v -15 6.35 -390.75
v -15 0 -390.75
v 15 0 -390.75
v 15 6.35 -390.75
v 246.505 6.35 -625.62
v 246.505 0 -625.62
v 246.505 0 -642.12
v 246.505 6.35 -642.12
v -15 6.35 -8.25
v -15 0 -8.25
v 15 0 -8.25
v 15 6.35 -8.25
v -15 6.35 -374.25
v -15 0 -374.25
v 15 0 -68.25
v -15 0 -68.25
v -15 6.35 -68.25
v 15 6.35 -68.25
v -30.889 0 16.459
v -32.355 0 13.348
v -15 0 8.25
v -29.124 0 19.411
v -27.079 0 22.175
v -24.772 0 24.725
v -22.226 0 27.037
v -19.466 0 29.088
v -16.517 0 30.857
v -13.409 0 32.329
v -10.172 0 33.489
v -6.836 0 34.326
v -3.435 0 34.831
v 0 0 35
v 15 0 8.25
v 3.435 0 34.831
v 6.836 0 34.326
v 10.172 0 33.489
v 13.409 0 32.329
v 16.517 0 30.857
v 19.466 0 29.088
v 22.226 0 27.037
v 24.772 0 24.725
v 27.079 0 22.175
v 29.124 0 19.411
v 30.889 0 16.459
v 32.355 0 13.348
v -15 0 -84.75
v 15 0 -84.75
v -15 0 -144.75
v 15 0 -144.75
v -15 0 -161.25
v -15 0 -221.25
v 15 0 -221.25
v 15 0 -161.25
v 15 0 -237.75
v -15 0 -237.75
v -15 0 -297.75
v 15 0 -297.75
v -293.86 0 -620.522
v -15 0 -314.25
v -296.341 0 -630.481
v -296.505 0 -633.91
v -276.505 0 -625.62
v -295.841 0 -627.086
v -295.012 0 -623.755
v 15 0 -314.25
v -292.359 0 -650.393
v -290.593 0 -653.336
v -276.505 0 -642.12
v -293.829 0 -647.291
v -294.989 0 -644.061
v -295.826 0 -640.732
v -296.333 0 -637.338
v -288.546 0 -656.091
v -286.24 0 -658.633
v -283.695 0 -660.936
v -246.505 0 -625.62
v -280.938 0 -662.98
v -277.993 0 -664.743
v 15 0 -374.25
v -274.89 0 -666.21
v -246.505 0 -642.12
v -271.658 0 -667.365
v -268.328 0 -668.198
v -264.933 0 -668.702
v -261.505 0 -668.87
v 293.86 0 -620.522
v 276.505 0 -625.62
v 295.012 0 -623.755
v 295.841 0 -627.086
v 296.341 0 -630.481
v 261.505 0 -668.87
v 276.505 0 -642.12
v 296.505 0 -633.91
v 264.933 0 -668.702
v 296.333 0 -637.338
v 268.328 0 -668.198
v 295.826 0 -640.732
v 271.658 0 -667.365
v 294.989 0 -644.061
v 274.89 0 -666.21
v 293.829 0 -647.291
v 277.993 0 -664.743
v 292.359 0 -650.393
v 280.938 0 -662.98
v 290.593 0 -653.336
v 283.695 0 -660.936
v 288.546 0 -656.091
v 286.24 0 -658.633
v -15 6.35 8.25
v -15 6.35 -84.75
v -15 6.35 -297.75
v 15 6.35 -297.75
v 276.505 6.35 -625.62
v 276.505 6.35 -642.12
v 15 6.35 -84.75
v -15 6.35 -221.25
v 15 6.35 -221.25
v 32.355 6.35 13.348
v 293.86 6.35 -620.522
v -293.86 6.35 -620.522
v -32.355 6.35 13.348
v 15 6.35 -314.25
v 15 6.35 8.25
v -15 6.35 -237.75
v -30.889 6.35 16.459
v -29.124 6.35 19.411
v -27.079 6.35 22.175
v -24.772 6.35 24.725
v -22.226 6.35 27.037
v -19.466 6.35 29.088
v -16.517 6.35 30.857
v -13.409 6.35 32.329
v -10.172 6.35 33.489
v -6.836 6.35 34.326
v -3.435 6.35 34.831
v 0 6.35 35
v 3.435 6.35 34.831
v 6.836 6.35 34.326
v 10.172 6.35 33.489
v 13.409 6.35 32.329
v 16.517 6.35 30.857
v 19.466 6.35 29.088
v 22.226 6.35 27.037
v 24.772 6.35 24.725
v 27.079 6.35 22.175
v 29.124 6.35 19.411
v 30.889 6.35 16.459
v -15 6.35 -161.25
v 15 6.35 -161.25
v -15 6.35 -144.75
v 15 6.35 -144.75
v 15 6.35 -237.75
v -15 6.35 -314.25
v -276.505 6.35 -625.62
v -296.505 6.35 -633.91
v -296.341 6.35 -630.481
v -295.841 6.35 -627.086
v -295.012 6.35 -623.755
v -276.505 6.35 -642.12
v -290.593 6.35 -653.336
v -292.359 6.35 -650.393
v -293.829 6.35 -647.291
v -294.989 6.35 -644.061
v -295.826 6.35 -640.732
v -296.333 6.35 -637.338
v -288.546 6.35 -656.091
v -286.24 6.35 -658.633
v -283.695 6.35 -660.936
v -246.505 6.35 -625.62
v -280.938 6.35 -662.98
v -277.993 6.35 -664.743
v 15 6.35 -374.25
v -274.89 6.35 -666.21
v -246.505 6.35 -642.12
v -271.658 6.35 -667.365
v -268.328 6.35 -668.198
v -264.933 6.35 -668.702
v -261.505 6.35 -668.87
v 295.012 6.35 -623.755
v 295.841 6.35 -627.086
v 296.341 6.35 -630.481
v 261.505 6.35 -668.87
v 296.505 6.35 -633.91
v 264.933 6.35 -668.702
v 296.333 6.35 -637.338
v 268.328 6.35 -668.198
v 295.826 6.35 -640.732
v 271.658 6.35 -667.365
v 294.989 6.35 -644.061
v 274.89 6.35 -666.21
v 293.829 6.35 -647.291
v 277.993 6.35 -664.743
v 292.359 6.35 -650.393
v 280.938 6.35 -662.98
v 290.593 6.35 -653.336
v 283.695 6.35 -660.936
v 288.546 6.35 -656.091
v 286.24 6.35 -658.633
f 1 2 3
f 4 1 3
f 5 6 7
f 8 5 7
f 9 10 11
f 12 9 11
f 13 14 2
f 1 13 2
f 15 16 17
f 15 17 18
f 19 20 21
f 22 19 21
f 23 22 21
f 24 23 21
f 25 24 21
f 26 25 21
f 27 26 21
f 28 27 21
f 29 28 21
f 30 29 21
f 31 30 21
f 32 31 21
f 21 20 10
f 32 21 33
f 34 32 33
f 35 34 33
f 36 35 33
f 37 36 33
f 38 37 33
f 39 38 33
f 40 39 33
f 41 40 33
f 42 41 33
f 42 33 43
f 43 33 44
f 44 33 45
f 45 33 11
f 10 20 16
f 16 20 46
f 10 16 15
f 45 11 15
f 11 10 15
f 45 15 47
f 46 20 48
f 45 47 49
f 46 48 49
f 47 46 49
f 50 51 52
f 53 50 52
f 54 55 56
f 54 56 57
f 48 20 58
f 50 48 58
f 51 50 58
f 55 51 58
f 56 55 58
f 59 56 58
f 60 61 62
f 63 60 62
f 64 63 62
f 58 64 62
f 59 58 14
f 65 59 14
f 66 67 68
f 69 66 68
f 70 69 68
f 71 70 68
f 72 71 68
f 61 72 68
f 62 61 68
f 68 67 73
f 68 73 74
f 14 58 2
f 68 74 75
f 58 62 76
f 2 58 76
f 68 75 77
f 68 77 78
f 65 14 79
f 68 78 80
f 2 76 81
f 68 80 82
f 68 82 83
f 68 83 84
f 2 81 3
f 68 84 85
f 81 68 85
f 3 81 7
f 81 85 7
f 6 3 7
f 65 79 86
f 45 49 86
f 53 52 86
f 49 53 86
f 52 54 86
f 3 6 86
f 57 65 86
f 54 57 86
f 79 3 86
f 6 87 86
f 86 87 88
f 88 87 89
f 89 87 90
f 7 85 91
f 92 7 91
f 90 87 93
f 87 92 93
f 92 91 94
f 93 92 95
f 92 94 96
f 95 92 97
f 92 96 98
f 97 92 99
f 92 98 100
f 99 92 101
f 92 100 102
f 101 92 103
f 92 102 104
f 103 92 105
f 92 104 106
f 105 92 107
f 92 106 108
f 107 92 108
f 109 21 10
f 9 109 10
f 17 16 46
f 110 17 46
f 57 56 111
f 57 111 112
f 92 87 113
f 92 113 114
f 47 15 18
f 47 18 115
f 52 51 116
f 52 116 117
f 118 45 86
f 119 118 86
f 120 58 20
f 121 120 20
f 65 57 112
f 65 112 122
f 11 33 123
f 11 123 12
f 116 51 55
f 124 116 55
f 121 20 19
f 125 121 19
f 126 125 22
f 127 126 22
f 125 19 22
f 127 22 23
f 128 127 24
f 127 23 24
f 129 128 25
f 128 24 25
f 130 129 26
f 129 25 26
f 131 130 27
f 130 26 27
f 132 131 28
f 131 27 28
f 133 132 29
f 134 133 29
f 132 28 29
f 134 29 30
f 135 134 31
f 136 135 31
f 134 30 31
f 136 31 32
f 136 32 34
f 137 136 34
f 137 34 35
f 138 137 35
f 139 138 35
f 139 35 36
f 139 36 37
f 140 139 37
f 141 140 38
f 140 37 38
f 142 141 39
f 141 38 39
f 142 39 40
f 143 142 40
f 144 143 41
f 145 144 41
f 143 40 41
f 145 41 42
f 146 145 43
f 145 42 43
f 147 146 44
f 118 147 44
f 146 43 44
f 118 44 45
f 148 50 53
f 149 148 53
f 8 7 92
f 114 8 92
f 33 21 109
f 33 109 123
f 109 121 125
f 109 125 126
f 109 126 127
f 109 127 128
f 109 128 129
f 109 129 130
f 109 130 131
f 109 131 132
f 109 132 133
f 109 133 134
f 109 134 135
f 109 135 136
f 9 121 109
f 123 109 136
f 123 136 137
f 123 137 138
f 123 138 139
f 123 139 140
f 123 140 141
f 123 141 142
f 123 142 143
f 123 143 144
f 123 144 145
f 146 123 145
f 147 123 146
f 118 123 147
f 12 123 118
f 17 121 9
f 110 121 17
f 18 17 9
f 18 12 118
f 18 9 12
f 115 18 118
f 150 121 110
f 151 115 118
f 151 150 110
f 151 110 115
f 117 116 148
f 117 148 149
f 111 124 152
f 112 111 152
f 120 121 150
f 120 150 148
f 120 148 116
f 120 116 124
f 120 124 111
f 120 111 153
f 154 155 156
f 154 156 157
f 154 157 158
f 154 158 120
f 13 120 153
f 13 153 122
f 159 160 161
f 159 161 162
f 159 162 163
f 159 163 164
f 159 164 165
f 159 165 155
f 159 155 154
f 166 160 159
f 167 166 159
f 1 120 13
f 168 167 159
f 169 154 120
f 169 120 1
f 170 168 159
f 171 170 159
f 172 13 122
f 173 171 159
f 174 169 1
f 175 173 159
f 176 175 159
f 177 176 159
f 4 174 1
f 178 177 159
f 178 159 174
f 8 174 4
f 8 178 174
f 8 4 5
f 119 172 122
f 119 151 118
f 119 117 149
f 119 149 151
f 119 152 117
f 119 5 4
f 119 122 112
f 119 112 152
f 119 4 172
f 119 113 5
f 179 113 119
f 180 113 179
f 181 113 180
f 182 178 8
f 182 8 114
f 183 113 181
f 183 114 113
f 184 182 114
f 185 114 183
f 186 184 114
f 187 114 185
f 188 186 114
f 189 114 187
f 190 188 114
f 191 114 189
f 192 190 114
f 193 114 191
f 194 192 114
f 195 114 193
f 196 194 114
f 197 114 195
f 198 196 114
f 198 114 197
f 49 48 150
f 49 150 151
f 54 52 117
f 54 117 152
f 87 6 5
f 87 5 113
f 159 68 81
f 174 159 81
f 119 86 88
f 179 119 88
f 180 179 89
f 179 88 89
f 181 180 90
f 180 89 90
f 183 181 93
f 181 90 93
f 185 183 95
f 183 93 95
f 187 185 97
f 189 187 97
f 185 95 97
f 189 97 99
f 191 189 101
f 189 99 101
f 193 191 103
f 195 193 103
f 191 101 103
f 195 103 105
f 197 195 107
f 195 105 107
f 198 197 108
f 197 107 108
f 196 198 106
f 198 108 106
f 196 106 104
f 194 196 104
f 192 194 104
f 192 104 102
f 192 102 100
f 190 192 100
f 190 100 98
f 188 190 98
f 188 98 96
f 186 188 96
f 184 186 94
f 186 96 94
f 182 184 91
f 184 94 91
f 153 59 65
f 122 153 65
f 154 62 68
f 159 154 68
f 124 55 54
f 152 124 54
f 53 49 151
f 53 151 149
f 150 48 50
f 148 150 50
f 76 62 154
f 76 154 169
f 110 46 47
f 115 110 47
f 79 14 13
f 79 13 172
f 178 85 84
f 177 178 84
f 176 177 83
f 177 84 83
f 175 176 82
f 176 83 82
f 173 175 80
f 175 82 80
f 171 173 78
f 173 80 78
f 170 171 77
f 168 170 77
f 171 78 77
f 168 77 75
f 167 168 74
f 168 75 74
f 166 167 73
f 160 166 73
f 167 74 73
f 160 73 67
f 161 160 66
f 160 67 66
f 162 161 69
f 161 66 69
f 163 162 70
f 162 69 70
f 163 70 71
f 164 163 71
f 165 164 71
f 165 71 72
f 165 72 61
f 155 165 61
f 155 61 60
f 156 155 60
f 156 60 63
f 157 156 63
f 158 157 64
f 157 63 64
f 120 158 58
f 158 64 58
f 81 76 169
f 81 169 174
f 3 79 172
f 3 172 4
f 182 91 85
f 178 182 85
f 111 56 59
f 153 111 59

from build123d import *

# Parameters (mm, degrees)
SKETCH1_W           = 30
SKETCH1_H           = 16.5
BOSS_EXTRUDE1_DEPTH = 6.35


with BuildPart() as part:
    # Sketch1 → Boss-Extrude1 (new body)
    with BuildSketch(Plane(origin=(0, 0, 0), x_dir=(1, 0, 0), z_dir=(0, 1, 0))):
        with BuildLine():
            Line((32.354745971, -13.34804904), (293.859745971, 620.52195096))
            ThreePointArc((293.859745971, 620.52195096), (290.592640987, 653.335588658), (261.505, 668.87))
            Line((261.505, 668.87), (-261.505, 668.87))
            ThreePointArc((-261.505, 668.87), (-290.592640987, 653.335588658), (-293.859745971, 620.52195096))
            Line((-293.859745971, 620.52195096), (-32.354745971, -13.34804904))
            ThreePointArc((-32.354745971, -13.34804904), (0, -35), (32.354745971, -13.34804904))
        make_face()
        with Locations((0, 76.5)):
            Rectangle(SKETCH1_W, SKETCH1_H, mode=Mode.SUBTRACT)
        with Locations((261.505, 633.87)):
            Rectangle(SKETCH1_W, SKETCH1_H, mode=Mode.SUBTRACT)
        Rectangle(SKETCH1_W, SKETCH1_H, mode=Mode.SUBTRACT)
        with Locations((0, 153)):
            Rectangle(SKETCH1_W, SKETCH1_H, mode=Mode.SUBTRACT)
        with Locations((0, 229.5)):
            Rectangle(SKETCH1_W, SKETCH1_H, mode=Mode.SUBTRACT)
        with Locations((0, 306)):
            Rectangle(SKETCH1_W, SKETCH1_H, mode=Mode.SUBTRACT)
        with Locations((0, 382.5)):
            Rectangle(SKETCH1_W, SKETCH1_H, mode=Mode.SUBTRACT)
        with Locations((-261.505, 633.87)):
            Rectangle(SKETCH1_W, SKETCH1_H, mode=Mode.SUBTRACT)
    extrude(amount=BOSS_EXTRUDE1_DEPTH)


solid = part.part
